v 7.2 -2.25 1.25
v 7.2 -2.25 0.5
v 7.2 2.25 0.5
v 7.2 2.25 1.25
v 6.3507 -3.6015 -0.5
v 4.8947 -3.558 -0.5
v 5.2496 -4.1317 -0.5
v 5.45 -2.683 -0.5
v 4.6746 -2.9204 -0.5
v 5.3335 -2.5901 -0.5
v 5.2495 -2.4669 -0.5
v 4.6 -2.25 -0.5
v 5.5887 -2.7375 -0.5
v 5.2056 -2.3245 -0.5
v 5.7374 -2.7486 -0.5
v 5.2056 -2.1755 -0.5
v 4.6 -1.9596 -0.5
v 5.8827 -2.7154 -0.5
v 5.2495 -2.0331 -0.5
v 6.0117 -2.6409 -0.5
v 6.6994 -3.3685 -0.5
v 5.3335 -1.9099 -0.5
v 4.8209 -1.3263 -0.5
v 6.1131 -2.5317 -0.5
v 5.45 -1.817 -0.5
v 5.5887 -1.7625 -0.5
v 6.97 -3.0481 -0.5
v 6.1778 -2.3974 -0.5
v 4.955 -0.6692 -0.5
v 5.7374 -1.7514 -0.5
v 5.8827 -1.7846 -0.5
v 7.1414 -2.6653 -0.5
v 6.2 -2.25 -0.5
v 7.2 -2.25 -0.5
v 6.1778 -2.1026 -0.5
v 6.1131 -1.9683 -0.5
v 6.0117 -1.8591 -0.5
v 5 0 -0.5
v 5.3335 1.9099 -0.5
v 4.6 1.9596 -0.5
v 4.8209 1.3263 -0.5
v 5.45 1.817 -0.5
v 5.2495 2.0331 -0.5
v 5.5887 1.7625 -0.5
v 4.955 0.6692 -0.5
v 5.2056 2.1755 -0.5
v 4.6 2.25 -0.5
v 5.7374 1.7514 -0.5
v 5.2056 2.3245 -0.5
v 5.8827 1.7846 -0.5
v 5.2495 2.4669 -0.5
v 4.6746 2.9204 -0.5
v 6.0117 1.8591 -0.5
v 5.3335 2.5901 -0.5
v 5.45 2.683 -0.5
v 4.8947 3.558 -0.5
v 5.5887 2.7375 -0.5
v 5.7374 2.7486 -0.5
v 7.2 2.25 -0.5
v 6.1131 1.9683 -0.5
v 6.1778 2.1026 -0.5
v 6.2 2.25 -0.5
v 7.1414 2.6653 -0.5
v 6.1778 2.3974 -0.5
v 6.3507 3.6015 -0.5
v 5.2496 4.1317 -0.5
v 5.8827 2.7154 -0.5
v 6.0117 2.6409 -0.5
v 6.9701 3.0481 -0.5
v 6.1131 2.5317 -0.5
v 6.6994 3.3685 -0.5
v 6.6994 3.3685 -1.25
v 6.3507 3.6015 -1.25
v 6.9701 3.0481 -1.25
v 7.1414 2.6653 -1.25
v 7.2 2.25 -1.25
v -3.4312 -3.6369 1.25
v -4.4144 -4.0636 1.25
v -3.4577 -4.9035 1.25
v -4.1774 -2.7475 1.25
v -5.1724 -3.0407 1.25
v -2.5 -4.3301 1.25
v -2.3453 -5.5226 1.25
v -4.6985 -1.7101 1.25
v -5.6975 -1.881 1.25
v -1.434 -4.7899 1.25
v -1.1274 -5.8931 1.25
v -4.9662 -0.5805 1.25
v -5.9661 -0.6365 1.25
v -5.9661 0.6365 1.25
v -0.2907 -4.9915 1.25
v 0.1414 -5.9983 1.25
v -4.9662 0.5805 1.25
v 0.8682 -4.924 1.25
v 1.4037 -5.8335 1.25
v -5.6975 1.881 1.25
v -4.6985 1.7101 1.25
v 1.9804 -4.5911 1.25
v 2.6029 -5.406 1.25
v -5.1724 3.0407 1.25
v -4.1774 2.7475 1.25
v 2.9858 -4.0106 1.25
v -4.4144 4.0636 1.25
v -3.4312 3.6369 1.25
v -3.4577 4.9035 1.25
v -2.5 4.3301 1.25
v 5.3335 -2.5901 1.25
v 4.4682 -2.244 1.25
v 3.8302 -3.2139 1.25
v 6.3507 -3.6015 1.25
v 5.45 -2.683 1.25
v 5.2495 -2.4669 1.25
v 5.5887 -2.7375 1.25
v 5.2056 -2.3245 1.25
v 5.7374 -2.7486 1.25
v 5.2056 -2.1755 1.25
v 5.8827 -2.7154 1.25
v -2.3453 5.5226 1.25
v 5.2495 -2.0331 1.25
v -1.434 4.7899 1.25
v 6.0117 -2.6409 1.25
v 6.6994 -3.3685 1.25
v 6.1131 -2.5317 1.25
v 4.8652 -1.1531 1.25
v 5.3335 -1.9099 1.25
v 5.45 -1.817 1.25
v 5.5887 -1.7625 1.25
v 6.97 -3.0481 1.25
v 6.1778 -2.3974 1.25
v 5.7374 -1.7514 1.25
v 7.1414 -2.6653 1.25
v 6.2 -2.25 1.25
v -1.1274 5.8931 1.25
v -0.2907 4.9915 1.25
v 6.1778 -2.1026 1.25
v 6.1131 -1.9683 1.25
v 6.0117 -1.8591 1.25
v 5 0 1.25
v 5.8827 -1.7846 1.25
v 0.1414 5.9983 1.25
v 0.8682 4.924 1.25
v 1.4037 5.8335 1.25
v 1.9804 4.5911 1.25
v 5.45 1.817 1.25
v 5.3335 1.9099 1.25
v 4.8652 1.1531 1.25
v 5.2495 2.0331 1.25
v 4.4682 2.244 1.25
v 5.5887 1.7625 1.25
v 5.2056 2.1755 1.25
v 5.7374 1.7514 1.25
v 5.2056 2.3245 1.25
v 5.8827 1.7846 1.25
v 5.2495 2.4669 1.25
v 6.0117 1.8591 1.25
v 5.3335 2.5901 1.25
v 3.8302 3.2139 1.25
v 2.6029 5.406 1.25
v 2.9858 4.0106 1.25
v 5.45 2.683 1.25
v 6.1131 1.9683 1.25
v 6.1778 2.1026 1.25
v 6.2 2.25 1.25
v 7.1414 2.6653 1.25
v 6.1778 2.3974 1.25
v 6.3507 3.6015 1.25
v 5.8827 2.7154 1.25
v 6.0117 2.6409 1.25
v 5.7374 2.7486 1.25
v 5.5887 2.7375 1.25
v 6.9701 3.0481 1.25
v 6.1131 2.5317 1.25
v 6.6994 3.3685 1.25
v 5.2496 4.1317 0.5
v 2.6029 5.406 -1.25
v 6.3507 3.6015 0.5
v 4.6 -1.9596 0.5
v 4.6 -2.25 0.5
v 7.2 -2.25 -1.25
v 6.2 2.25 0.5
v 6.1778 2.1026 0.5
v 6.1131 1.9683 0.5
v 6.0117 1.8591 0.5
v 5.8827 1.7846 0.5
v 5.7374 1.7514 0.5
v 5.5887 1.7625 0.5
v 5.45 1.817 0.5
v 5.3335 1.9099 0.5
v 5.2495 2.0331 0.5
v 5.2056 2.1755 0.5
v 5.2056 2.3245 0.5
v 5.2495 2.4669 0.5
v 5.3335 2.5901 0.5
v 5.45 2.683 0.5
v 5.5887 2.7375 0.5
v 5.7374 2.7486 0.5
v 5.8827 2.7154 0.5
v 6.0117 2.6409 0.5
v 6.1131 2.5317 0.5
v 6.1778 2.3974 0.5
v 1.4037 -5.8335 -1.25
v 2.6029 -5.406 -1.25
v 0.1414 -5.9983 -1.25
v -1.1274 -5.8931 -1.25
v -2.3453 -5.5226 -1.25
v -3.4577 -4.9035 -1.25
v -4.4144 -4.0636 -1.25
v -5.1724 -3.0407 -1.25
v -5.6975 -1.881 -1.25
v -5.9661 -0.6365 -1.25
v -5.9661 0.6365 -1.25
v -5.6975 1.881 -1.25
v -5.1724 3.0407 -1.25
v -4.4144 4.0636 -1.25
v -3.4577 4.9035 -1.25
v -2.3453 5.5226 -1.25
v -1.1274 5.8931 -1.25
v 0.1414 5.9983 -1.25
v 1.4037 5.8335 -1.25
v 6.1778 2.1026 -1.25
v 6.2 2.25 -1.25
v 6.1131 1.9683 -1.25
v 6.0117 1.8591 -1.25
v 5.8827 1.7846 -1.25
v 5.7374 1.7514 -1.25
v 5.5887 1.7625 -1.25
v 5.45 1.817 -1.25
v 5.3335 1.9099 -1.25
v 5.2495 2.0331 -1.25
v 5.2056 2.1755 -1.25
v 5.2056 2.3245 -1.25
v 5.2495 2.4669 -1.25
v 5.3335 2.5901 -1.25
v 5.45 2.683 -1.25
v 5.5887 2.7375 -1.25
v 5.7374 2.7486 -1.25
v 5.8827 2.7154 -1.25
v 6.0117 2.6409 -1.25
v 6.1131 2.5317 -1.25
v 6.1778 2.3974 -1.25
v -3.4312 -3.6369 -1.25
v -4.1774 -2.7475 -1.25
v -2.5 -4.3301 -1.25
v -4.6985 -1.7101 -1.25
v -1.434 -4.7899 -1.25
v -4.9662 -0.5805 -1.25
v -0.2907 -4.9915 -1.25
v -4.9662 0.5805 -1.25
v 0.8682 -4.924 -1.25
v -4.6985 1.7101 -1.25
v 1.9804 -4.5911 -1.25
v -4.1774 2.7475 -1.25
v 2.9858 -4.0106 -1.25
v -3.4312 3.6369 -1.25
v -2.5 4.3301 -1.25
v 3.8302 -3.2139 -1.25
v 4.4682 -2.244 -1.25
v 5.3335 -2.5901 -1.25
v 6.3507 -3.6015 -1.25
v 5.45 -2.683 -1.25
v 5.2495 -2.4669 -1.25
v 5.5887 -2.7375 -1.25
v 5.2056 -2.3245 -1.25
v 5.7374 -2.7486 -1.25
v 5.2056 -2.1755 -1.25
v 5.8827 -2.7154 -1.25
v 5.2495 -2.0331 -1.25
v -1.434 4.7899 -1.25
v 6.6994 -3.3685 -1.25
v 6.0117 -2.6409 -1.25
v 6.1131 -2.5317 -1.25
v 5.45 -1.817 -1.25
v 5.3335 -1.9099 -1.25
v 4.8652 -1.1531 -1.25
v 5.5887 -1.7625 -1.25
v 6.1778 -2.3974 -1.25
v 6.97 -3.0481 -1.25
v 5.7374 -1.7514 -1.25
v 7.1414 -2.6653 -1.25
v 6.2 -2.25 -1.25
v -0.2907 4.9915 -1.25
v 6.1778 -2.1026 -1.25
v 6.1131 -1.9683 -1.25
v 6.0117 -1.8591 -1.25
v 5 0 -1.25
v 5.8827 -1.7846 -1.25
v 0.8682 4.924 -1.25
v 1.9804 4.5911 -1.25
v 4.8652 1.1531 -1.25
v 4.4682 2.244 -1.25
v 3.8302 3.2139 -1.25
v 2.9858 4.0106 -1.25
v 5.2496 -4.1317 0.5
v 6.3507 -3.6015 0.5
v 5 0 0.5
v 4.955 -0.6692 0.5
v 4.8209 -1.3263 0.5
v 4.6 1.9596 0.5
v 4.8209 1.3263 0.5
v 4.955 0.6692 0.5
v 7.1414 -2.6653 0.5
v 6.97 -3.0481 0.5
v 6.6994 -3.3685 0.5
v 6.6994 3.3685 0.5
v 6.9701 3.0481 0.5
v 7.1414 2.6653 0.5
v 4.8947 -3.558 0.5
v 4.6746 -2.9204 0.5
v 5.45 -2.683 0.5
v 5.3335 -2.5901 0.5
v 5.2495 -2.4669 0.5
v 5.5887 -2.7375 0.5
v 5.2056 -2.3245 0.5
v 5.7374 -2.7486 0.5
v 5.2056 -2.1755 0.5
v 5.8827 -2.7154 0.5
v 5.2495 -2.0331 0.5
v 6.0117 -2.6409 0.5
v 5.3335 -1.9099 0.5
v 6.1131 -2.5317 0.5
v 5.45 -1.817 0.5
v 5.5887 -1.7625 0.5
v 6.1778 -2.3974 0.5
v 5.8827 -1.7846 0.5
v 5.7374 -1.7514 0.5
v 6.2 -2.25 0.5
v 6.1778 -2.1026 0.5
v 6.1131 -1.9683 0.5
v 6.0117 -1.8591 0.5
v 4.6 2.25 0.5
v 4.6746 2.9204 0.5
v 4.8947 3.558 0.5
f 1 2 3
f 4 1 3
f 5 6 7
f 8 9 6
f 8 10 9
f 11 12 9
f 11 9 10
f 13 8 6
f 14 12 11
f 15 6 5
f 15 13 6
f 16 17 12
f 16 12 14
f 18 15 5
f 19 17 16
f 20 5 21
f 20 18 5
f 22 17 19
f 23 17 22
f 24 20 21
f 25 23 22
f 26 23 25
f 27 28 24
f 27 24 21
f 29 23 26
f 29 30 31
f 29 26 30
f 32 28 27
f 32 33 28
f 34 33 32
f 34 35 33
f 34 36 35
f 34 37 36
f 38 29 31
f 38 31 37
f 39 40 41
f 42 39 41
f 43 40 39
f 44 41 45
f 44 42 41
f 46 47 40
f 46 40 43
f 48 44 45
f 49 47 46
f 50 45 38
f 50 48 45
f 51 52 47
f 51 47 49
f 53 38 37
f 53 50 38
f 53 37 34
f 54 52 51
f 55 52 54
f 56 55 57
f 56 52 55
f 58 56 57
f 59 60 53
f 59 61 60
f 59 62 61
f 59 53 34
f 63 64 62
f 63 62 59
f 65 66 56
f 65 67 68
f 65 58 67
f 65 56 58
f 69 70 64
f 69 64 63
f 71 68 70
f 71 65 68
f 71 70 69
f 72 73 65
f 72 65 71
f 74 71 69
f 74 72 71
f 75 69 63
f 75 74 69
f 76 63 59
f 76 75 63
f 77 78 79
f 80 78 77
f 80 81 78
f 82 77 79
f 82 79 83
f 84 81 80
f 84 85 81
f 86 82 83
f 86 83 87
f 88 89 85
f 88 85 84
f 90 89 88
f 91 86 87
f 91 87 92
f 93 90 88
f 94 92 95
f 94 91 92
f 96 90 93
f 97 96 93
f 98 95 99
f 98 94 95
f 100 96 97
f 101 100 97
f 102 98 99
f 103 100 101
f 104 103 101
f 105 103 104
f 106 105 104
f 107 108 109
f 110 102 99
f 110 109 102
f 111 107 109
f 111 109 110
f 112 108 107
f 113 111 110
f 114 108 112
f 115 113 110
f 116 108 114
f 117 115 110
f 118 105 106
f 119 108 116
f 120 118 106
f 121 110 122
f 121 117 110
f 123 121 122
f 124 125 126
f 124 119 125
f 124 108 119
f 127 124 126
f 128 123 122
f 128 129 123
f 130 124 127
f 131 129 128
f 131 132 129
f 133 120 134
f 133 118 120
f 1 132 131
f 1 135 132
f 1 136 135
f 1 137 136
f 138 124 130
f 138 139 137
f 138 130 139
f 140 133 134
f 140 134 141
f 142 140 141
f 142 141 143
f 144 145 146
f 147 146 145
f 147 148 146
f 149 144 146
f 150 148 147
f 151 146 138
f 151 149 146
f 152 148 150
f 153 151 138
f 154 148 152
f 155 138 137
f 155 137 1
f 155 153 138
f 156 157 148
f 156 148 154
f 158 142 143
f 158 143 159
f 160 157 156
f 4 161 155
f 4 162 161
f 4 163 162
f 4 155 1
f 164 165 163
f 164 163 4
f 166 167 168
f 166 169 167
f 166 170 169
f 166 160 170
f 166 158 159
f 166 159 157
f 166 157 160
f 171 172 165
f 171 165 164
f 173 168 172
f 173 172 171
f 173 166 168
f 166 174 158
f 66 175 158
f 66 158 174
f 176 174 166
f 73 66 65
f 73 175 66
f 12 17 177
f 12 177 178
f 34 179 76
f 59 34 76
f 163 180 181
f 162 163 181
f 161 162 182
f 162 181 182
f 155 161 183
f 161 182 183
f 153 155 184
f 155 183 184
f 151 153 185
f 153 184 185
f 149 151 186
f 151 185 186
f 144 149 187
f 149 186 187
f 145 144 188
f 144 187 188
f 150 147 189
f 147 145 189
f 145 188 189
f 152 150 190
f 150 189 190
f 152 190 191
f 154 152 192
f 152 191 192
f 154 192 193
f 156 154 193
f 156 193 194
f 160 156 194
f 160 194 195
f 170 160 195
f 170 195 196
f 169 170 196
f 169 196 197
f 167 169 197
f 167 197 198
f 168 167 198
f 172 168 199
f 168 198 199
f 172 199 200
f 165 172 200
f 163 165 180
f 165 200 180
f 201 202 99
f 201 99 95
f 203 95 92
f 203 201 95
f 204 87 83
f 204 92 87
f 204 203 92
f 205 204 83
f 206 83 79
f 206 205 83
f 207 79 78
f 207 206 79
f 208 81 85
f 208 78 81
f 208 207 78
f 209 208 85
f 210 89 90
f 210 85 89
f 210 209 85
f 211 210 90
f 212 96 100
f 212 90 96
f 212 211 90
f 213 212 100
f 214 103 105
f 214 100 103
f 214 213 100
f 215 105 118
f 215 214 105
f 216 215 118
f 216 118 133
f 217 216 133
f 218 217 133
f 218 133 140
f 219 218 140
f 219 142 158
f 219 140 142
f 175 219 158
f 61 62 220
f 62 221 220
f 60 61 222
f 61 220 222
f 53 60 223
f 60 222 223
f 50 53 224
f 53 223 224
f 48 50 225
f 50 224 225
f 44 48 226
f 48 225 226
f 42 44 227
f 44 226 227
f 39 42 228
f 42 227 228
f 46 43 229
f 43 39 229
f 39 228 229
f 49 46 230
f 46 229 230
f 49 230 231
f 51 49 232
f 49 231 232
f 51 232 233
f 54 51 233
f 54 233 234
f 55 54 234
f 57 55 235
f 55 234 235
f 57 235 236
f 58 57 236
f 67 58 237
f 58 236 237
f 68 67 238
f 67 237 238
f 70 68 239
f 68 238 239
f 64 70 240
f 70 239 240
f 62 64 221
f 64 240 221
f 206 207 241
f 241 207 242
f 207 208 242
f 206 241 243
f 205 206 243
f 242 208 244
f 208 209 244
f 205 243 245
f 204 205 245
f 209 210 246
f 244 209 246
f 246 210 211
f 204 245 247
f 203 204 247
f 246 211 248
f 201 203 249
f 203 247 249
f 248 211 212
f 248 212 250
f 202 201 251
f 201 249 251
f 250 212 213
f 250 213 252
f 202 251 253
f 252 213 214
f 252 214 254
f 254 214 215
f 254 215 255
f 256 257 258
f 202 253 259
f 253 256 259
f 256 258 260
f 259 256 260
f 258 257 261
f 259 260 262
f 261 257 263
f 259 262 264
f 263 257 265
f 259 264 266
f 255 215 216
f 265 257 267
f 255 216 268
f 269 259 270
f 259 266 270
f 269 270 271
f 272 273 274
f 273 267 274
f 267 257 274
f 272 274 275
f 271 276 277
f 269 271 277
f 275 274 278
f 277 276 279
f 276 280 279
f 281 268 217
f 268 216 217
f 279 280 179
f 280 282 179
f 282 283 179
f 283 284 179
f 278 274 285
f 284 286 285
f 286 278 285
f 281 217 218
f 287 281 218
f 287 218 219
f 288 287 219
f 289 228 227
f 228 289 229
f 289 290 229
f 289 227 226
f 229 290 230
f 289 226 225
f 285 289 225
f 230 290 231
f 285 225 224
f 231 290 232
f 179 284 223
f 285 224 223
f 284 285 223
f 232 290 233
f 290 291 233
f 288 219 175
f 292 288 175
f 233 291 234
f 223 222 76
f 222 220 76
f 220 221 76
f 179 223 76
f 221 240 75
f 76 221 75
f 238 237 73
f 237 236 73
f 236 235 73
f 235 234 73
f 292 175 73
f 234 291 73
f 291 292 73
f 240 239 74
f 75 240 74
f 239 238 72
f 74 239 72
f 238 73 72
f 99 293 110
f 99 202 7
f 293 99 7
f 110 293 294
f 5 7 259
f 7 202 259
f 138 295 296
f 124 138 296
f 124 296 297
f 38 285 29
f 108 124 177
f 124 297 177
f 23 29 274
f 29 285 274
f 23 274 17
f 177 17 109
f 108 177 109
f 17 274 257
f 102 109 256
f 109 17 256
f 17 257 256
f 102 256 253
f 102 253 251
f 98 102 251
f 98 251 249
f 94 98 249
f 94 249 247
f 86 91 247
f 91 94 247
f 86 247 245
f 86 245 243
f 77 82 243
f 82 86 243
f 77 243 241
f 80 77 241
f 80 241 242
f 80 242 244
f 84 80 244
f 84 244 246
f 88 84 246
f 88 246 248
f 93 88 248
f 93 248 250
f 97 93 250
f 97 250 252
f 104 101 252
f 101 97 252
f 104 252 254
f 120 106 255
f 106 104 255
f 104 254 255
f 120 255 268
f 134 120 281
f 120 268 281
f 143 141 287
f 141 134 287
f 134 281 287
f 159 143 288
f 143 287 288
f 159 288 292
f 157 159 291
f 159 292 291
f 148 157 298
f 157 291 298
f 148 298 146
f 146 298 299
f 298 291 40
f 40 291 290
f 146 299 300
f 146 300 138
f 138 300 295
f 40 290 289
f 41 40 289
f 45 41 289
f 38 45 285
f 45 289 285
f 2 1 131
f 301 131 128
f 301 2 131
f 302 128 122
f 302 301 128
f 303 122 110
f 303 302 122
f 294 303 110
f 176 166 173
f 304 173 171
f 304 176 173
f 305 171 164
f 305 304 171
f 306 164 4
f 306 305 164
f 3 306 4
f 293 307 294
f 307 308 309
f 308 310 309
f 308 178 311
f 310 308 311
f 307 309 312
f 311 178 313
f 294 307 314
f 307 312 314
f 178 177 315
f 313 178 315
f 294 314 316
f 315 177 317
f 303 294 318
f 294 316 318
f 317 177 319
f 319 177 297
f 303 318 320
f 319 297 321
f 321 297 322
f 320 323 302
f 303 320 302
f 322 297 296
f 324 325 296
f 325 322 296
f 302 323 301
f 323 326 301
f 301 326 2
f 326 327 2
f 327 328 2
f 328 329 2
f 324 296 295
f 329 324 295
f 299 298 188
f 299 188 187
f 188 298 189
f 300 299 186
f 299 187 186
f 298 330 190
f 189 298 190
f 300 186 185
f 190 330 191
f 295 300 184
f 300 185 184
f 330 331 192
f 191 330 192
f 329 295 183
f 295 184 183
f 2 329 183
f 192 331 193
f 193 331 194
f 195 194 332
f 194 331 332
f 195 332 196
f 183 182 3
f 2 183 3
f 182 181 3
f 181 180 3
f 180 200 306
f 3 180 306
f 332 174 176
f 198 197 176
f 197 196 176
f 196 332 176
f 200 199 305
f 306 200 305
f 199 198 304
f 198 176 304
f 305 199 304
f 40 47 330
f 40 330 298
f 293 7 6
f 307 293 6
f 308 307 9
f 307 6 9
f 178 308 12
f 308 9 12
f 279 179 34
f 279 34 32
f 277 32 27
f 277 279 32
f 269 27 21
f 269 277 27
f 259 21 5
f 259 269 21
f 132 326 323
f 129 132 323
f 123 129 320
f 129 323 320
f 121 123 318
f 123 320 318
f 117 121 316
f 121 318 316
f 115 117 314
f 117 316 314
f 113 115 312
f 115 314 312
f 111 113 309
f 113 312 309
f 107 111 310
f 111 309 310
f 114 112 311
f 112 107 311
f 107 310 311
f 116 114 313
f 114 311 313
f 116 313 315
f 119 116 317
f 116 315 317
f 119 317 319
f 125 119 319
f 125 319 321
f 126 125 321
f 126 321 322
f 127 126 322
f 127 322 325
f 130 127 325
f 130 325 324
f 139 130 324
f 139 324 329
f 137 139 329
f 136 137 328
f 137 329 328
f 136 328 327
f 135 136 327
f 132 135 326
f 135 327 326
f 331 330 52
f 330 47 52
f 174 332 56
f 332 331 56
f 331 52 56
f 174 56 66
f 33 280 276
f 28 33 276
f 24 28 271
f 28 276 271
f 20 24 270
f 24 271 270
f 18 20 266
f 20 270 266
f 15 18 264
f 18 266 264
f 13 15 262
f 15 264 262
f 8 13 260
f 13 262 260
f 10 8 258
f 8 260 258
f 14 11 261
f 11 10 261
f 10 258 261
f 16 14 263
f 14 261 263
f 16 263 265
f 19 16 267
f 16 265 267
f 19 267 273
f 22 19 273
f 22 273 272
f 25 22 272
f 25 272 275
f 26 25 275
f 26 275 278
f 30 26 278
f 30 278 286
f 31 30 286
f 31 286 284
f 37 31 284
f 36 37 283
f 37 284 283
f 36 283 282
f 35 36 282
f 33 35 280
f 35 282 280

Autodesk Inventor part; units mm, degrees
ref_plane "YZ Plane" through (0, 0, 0) normal (1, 0, 0) x (0, 1, 0)
ref_plane "XZ Plane" through (0, 0, 0) normal (0, 1, 0) x (-1, 0, 0)
ref_plane "XY Plane" through (0, 0, 0) normal (0, 0, 1) x (1, 0, 0)
sketch "Sketch1" plane through (0, 0, 0) normal (0, 0, 1) x (1, 0, 0)
  circle A0 centre (0, 0) radius 5
  circle A1 centre (5.7, 2.25) radius 0.5
  circle A2 centre (5.7, -2.25) radius 0.5
  line L0 (0, 0) -> (12.1327, 0) construction
  arc A3 (7.2, 2.25) -> (6.3507, 3.6015) centre (5.7, 2.25) ccw
  arc A4 (6.3507, -3.6015) -> (7.2, -2.25) centre (5.7, -2.25) ccw
  line L1 (2.6029, 5.406) -> (6.3507, 3.6015)
  line L2 (2.6029, -5.406) -> (6.3507, -3.6015)
  line L3 (7.2, -2.25) -> (7.2, 2.25)
  arc A5 (2.6029, 5.406) -> (2.6029, -5.406) centre (0, 0) ccw
  dimension "d1" = 10
  dimension "d12" = 1
  dimension "d13" = 1
  dimension "d14" = 4.5
  dimension "d16" = 3
  dimension "d17" = 3
  dimension "d18" = 5.7
  dimension "d19" = 6
extrude "Extrusion1" add sketch "Sketch1" along normal mid plane 2.5
sketch "Sketch2" plane through (0, 0, 0) normal (0, 0, 1) x (1, 0, 0)
  circle A0 centre (5.7, 2.25) radius 0.5 projected
  circle A1 centre (5.7, -2.25) radius 0.5 projected
  line L0 (7.65, 2.25) -> (7.65, -2.25) construction
  line L1 (4.6, 2.25) -> (4.6, -2.25)
  line L2 (10.7, -2.25) -> (10.7, 2.25)
  arc A2 (10.7, 2.25) -> (4.6, 2.25) centre (7.65, 2.25) ccw
  arc A3 (4.6, -2.25) -> (10.7, -2.25) centre (7.65, -2.25) ccw
  point P0 (0, 0)
  point P1 (7.65, 0)
  dimension "d20" = 1.1
  dimension "d21" = 5
extrude "Extrusion2" cut sketch "Sketch2" along normal mid plane 1
properties part number "double spring swivel 6"
